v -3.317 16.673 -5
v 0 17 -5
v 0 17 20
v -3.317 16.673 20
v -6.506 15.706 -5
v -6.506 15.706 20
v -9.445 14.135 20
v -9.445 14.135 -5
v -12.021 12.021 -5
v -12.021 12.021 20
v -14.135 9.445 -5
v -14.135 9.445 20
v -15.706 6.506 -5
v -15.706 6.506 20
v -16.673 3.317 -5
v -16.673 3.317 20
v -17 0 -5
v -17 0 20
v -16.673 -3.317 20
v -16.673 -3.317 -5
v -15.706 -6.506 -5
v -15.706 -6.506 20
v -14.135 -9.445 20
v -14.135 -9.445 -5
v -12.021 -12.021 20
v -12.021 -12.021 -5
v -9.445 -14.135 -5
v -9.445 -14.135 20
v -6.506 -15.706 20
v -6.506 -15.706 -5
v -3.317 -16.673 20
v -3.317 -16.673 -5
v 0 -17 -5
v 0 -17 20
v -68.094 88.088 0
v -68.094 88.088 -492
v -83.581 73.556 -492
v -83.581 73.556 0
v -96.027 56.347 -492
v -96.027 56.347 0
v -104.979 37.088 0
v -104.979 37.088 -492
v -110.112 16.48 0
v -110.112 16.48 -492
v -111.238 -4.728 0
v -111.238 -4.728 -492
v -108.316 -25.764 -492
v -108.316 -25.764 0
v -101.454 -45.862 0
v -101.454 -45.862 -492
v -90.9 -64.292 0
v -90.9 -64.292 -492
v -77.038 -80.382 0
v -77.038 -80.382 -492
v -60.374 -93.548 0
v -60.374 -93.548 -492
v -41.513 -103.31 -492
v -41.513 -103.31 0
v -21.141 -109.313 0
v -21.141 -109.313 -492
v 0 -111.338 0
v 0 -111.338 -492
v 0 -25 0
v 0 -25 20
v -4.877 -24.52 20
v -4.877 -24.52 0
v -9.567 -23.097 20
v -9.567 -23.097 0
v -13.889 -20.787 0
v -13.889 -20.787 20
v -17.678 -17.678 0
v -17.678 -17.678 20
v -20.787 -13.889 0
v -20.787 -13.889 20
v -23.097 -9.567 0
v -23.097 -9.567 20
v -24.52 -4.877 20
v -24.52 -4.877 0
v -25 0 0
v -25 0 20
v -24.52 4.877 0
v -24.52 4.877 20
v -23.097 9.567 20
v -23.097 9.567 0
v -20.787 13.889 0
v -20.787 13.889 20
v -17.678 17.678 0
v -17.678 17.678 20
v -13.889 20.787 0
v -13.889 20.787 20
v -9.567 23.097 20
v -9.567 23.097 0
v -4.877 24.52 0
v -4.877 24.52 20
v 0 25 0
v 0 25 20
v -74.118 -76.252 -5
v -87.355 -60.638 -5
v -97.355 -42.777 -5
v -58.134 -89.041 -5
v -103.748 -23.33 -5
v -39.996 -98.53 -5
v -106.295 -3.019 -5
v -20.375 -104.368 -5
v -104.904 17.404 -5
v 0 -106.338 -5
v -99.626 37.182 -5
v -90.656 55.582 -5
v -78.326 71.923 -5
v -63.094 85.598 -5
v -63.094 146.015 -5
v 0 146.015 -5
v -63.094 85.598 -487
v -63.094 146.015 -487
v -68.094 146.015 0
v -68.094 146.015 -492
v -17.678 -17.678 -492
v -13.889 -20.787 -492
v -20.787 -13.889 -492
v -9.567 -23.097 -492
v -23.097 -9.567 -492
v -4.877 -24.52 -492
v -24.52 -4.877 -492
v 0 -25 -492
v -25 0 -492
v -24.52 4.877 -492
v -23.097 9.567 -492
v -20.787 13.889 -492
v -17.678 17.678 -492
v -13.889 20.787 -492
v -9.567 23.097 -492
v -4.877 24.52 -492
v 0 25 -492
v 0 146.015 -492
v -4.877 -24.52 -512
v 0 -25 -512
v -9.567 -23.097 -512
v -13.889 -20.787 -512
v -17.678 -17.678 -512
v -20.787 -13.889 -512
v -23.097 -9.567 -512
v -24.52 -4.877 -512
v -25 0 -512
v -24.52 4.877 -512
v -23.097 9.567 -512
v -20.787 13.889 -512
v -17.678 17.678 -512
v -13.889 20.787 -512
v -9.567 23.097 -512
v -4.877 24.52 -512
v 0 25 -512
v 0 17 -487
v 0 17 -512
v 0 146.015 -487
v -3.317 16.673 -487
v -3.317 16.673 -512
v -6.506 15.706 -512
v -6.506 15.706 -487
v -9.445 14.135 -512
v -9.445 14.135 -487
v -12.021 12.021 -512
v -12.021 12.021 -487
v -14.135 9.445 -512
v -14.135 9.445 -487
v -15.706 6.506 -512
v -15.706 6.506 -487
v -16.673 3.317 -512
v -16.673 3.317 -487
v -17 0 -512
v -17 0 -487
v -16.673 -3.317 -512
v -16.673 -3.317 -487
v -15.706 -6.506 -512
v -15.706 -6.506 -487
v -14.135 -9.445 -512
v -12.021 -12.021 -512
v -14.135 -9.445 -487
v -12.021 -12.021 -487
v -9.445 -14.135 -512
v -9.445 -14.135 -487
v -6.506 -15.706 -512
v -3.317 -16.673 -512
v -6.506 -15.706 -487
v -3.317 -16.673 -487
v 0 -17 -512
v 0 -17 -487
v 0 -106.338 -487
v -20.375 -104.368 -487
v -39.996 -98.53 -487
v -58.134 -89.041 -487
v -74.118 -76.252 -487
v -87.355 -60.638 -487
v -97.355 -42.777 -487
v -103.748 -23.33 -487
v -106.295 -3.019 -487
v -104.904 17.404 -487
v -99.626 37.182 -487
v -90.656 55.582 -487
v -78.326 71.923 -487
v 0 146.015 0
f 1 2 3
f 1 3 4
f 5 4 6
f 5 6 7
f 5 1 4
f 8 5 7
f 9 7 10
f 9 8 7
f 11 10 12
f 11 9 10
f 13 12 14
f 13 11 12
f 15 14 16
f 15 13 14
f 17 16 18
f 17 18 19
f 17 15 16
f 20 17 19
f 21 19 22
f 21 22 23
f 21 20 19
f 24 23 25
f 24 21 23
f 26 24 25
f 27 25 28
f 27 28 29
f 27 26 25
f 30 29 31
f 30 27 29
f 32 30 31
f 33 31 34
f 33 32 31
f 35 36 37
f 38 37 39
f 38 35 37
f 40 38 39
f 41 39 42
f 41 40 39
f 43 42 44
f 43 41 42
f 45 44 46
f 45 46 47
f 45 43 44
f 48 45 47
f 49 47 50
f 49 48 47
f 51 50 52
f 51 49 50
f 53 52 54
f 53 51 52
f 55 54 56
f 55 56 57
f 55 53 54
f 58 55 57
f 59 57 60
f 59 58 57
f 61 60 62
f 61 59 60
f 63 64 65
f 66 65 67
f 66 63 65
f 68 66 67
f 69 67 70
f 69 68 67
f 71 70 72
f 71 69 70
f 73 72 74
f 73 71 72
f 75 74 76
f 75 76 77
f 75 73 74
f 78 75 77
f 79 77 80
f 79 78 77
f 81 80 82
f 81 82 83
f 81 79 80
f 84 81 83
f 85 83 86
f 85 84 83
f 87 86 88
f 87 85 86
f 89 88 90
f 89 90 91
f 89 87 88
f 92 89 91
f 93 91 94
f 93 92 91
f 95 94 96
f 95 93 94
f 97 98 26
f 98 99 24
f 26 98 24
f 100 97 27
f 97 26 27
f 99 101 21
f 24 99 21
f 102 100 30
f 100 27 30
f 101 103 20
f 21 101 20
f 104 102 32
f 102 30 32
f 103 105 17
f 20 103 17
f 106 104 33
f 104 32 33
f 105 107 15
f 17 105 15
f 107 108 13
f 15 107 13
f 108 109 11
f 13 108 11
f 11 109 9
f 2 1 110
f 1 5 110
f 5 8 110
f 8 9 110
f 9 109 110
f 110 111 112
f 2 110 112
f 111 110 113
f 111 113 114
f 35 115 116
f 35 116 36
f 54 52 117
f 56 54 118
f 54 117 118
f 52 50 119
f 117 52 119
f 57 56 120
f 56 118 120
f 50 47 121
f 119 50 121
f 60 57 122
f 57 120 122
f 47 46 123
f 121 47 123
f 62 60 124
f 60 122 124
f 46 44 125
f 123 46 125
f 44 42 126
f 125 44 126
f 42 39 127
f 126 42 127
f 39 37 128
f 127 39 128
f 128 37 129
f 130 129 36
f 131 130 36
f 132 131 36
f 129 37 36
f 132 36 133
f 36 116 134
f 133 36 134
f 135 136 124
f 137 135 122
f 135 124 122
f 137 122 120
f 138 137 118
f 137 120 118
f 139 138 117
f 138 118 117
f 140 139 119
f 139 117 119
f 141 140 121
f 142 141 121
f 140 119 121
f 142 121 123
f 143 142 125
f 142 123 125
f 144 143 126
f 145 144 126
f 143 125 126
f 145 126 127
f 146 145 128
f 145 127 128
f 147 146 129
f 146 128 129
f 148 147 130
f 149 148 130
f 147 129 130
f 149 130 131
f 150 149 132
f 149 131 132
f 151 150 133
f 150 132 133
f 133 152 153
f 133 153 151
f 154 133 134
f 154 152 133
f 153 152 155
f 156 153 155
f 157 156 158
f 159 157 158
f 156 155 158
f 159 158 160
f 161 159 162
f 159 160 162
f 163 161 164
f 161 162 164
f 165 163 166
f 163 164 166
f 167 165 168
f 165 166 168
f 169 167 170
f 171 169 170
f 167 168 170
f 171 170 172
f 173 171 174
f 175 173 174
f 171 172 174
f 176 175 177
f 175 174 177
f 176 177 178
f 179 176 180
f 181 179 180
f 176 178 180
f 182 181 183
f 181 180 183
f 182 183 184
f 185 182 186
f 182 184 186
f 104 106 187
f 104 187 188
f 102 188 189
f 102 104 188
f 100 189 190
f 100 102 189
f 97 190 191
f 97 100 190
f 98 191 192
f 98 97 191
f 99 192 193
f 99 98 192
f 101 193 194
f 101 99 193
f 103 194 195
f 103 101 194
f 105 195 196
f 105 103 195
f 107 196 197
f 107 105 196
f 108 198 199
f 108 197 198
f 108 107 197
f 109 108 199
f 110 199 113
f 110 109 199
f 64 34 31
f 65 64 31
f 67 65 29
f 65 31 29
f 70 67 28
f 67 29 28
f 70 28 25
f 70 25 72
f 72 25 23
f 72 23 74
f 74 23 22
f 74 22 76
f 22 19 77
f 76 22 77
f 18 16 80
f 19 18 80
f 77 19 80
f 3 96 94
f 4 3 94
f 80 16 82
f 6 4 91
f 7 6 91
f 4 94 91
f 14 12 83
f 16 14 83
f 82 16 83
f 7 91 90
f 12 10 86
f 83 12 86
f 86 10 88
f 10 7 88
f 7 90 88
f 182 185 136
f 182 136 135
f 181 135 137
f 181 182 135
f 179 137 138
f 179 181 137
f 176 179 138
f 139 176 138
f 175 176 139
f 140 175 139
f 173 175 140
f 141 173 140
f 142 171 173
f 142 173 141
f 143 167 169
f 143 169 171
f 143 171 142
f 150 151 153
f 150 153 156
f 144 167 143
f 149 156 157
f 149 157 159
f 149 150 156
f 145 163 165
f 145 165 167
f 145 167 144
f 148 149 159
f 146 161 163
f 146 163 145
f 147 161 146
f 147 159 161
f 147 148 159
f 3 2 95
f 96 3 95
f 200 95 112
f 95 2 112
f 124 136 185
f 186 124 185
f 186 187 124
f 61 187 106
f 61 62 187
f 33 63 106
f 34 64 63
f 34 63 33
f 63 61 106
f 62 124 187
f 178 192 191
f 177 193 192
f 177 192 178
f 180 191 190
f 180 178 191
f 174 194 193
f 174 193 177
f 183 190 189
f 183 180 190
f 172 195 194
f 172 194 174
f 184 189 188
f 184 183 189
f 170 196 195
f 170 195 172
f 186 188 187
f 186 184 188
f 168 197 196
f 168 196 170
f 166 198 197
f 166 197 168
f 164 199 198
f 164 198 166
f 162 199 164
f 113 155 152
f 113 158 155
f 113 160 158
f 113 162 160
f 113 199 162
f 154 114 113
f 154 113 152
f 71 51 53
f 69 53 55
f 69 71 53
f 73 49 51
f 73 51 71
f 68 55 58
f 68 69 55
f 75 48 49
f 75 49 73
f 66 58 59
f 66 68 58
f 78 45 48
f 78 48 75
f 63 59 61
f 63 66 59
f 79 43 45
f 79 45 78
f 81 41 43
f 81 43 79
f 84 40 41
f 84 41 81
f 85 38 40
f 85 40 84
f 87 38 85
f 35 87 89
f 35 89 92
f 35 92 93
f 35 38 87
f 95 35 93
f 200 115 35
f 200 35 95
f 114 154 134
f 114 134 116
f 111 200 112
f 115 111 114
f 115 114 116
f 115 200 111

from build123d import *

# Parameters (mm, degrees)
BOSS_EXTRUDE1_DEPTH      = 20
BOSS_EXTRUDE1_DEPTH_BACK = 5
BOSS_EXTRUDE2_START      = -5
BOSS_EXTRUDE2_DEPTH      = 5
BOSS_EXTRUDE3_REACH      = 541.227


with BuildPart() as part:
    # Sketch1 → Boss-Extrude1 (new, two sides: drawn at the far end of the back side and taken through both)
    with BuildSketch(Plane.XY.offset(-BOSS_EXTRUDE1_DEPTH_BACK)):
        with BuildLine():
            Line((0, 25), (0, 17))
            ThreePointArc((0, 17), (-17, 0), (0, -17))
            Line((0, -17), (0, -25))
            ThreePointArc((0, -25), (-25, 0), (0, 25))
        make_face()
    extrude(amount=BOSS_EXTRUDE1_DEPTH + BOSS_EXTRUDE1_DEPTH_BACK)

    # Sketch2 → Boss-Extrude2 (add)
    with BuildSketch(Plane.XY.offset(BOSS_EXTRUDE2_START)):
        with BuildLine():
            Line((0, 25), (0, 146.014758251))
            Line((0, 146.014758251), (-68.093579632, 146.014758251))
            Line((-68.093579632, 146.014758251), (-68.093579632, 88.087940795))
            ThreePointArc((-68.093579632, 88.087940795), (-105.365516189, -35.976782774), (0, -111.338317306))
            Line((0, -111.338317306), (0, -25))
            ThreePointArc((0, -25), (-25, 0), (0, 25))
        make_face()
    extrude(amount=BOSS_EXTRUDE2_DEPTH)


with BuildPart() as body_2:
    # Mirror2: mirrored copy
    add(part.part.mirror(Plane.XY.offset(-246)))

    # Sketch3 → Boss-Extrude3 (add, up to next)
    with BuildSketch(Plane(origin=(0, 0, -5), x_dir=(-1, 0, 0), z_dir=(0, 0, -1)), mode=Mode.PRIVATE) as boss_extrude3_sk1:
        with BuildLine():
            Line((68.093579632, 146.014758251), (68.093579632, 88.087940795))
            ThreePointArc((68.093579632, 88.087940795), (105.365516189, -35.976782774), (0, -111.338317306))
            Line((0, -111.338317306), (0, -106.338317306))
            ThreePointArc((0, -106.338317306), (101.020289155, -33.207512802), (63.093579632, 85.598118769))
            Line((63.093579632, 85.598118769), (63.093579632, 146.014758251))
            Line((63.093579632, 146.014758251), (68.093579632, 146.014758251))
        make_face()
    boss_extrude3_tool1 = extrude(boss_extrude3_sk1.sketch, amount=BOSS_EXTRUDE3_REACH, mode=Mode.PRIVATE) - body_2.part

    add(part.part)  # Boss-Extrude3 merges part
    add(boss_extrude3_tool1.solids().sort_by_distance((-65.897627, 115.806439, -5))[0])


solid = body_2.part
